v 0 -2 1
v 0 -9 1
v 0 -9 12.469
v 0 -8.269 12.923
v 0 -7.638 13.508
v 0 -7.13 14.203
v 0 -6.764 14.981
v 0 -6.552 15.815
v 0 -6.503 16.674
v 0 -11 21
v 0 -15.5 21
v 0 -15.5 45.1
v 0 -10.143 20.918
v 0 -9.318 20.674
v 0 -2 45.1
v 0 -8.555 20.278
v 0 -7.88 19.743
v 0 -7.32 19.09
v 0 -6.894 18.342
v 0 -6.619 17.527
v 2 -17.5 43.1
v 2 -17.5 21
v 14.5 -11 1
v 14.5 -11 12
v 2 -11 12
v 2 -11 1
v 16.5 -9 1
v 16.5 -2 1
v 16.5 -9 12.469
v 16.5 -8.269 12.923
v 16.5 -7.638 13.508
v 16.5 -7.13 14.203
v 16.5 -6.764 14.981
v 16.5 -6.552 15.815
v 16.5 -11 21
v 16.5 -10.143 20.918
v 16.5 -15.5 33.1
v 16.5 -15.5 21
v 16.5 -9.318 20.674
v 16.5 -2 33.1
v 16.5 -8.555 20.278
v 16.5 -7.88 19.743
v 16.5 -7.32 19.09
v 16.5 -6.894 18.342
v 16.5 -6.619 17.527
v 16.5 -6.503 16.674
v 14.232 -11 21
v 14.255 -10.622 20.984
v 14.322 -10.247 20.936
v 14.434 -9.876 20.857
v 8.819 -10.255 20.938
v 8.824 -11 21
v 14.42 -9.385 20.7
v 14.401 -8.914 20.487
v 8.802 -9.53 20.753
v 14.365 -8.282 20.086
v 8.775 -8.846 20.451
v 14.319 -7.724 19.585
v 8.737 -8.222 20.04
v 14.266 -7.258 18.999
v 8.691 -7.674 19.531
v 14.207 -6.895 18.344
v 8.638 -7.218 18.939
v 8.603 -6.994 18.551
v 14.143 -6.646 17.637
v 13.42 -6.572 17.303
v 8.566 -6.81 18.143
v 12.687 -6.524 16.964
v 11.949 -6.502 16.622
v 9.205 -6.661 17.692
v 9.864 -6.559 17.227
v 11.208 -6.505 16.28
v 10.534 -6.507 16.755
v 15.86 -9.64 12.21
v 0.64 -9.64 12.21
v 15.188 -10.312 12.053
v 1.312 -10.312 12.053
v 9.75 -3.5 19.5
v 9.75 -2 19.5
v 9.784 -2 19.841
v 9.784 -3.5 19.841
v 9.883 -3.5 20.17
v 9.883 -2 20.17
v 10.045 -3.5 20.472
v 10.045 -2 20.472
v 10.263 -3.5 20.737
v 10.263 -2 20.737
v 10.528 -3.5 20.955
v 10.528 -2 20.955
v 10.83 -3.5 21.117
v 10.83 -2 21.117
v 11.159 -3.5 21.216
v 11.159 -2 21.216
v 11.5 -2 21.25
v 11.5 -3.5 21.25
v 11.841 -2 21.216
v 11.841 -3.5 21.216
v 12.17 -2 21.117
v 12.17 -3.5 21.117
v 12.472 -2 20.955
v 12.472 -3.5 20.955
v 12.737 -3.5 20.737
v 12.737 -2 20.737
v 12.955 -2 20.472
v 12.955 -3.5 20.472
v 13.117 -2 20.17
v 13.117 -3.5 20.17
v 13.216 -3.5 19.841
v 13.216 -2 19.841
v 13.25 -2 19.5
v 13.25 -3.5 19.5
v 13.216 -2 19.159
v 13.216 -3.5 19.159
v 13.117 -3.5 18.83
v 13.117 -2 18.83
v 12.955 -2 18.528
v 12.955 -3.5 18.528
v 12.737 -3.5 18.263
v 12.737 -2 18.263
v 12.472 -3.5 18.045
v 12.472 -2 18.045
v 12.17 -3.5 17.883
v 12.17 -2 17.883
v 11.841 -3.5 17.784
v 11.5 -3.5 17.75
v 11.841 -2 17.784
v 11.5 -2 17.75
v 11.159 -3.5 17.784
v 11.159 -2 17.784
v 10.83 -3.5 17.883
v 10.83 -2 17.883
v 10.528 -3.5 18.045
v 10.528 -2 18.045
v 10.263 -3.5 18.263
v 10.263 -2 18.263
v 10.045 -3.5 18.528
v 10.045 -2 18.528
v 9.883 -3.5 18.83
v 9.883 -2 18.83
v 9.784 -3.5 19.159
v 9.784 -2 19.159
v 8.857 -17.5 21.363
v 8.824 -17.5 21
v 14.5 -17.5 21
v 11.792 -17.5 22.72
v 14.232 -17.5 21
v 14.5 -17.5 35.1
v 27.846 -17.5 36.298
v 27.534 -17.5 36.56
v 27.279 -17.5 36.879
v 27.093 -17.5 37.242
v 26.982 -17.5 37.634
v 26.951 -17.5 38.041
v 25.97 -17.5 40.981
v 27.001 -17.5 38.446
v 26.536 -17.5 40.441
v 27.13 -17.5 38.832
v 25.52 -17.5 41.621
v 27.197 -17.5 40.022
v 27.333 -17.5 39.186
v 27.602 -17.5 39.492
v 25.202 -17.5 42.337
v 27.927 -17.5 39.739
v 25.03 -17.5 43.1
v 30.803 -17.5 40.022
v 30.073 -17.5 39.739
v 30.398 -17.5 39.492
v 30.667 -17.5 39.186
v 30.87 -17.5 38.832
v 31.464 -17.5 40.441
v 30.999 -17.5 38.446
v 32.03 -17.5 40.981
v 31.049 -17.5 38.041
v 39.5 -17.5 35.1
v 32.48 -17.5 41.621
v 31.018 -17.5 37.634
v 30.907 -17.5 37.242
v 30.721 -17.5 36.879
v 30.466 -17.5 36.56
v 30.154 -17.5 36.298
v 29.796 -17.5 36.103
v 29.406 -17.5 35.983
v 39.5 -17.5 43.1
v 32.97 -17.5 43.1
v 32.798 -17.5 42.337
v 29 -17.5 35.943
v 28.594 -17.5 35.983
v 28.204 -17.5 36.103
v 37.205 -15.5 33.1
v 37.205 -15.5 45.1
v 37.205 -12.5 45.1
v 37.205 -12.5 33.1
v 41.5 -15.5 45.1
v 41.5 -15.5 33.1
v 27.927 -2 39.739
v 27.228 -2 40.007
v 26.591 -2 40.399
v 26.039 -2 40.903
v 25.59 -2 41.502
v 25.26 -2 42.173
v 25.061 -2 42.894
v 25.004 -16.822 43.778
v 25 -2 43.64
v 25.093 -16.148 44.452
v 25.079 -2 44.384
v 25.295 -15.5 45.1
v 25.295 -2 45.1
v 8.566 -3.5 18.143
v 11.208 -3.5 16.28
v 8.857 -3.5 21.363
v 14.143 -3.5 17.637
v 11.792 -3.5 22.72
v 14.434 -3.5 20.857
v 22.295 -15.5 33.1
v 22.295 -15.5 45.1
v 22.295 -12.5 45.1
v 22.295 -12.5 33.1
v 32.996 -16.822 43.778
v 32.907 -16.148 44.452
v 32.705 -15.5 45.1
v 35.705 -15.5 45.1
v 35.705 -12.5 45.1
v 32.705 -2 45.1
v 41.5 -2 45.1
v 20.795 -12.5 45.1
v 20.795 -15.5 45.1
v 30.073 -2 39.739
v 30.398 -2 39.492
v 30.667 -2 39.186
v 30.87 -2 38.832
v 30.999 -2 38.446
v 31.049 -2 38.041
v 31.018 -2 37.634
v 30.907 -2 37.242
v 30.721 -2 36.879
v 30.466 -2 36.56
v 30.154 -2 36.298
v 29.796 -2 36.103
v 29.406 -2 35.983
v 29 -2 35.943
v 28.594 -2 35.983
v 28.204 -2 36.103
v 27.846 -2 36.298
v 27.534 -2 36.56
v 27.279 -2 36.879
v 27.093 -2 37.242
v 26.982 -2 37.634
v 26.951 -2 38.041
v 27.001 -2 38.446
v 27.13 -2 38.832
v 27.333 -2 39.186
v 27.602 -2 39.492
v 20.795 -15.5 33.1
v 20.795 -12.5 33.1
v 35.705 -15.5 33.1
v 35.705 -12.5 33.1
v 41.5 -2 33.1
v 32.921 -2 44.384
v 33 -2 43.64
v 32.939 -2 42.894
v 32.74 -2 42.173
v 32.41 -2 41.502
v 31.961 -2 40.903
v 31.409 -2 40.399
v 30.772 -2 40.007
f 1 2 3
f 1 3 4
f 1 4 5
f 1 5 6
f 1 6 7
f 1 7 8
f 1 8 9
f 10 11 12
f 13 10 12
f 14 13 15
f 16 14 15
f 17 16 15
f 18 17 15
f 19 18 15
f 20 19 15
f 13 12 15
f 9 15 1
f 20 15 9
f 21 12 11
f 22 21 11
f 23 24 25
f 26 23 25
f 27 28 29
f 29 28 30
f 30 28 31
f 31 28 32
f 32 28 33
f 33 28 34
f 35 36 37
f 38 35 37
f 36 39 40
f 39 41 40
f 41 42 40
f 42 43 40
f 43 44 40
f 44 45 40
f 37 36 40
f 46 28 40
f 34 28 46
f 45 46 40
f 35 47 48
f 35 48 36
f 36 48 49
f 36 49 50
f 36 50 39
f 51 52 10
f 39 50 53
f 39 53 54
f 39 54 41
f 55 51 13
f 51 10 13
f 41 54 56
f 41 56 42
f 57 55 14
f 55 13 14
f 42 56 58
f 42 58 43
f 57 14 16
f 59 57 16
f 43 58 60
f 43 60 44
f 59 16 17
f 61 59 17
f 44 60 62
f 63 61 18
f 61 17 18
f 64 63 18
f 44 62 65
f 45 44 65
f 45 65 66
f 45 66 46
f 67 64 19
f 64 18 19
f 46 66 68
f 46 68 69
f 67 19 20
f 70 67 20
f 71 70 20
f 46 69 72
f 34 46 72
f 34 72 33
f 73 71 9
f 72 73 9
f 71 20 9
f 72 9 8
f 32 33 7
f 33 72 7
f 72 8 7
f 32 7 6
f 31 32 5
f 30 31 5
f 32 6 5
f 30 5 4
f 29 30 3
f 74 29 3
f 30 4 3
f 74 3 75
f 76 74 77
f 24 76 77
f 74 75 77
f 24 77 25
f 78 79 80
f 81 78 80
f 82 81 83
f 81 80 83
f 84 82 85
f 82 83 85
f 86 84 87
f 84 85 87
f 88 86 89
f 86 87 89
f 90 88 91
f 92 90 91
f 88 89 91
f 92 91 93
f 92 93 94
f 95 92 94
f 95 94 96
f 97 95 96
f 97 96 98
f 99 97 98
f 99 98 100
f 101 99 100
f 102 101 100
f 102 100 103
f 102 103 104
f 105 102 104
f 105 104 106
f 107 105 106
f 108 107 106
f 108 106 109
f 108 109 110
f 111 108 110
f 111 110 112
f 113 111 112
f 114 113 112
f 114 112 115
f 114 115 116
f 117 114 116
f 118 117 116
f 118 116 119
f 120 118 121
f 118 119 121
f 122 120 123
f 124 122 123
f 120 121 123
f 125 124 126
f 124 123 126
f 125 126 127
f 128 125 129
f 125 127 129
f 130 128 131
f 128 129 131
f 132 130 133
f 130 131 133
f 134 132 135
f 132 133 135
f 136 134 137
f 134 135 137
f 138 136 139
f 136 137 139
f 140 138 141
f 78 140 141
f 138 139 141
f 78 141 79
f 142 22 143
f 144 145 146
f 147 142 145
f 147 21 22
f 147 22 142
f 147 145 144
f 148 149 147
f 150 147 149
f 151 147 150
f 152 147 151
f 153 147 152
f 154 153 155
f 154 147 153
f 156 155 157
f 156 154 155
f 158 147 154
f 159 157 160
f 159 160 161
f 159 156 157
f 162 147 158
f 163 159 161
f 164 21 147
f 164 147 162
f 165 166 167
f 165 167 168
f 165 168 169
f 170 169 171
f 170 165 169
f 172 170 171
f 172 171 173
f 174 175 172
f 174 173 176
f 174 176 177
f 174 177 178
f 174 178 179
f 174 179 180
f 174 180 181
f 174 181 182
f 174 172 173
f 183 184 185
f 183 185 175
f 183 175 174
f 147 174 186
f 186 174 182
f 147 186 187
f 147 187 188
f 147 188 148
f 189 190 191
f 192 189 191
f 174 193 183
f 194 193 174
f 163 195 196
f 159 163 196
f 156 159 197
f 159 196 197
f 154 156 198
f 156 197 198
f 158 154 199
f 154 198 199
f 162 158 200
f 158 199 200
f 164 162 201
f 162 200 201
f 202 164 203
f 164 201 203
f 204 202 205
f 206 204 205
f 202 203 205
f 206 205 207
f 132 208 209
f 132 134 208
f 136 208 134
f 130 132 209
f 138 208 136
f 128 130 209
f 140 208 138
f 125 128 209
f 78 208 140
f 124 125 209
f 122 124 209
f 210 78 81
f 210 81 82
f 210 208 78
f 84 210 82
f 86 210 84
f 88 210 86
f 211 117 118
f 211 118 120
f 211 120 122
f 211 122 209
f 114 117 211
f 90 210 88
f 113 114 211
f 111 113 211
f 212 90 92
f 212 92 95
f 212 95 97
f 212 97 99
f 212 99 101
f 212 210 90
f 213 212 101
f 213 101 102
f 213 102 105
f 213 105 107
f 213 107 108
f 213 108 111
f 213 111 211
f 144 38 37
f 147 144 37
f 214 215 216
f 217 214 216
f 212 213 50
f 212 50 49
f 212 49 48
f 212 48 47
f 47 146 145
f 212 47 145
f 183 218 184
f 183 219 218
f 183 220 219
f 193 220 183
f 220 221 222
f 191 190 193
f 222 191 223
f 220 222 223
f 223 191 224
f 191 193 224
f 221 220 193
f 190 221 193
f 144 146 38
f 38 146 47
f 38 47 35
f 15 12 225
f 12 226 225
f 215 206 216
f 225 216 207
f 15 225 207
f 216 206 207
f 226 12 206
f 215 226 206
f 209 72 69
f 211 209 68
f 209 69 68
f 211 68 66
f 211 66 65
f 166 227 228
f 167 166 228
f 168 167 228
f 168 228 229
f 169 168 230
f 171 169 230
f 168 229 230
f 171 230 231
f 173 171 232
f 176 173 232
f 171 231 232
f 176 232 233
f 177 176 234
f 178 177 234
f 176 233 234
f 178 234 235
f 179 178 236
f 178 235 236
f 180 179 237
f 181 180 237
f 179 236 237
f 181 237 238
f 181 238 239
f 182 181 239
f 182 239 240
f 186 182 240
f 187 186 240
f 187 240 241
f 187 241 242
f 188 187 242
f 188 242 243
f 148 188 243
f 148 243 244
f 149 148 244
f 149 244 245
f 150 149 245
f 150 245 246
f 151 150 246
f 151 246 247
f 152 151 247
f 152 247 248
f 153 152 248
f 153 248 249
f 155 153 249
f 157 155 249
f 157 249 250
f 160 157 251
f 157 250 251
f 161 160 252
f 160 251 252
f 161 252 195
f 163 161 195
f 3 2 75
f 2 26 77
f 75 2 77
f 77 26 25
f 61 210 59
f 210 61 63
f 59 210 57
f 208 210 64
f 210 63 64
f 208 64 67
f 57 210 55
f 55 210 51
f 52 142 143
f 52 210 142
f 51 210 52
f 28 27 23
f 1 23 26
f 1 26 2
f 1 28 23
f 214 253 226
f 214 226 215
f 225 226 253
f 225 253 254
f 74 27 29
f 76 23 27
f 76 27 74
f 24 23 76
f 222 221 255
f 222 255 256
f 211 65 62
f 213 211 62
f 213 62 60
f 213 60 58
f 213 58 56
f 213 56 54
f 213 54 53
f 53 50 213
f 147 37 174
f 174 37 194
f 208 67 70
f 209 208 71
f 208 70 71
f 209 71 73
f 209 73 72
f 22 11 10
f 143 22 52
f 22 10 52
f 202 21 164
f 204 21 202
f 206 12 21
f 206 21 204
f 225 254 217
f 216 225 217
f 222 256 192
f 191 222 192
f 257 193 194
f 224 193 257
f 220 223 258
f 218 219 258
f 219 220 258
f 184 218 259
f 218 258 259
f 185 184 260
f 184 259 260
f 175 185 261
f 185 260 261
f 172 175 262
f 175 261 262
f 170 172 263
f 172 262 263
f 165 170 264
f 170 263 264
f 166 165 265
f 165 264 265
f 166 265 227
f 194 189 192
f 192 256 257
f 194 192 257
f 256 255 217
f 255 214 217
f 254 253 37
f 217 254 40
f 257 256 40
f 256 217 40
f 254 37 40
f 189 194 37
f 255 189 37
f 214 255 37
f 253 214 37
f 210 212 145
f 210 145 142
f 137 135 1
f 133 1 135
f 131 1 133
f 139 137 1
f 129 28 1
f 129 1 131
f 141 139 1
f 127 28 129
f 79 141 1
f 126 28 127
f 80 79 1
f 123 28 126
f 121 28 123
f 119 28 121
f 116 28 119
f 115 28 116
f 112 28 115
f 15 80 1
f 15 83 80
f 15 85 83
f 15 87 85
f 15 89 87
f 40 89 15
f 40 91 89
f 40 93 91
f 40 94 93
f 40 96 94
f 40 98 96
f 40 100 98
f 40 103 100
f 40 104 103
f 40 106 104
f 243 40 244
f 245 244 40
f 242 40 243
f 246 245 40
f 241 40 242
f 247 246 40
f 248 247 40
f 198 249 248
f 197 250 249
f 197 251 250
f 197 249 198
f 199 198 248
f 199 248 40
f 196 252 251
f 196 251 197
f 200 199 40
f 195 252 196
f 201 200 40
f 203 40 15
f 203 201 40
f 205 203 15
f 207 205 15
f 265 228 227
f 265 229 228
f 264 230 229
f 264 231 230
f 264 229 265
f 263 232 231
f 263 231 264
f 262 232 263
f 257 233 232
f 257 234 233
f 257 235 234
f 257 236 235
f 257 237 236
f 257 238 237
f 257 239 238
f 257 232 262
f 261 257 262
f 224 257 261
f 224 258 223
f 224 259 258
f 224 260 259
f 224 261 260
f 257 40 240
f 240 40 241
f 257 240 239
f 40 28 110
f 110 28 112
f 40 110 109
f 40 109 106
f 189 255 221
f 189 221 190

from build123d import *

# Parameters (mm, degrees)
F1_DEPTH  = 17.5
F2_W      = 16.5
F2_H      = 20
F3_DEPTH  = 11
F4_R      = 1.75
F6_DEPTH  = 22.5
F8_DEPTH  = 7.5
F9_DEPTH  = 13.1
F10_DEPTH = 24.9
F11_R     = 1.75
F12_DEPTH = 2
F13_W     = 15.5
F13_H     = 6.6
F13_H_2   = 5.4
F14_DEPTH = 25
F15_DEPTH = 16.5
F17_DEPTH = 25
F18_W     = 1.5
F18_H     = 3
F19_DEPTH = 25
F21_DEPTH = 15.5
F22_SIZE  = 1.99999
F23_SIZE  = 2


# Not quite as in the source:
# - a fillet or chamfer is up to 0.001 mm smaller than in the source, because OpenCascade refuses the exact size


with BuildPart() as f1:
    # F0 (on Front) → F1 (new body)
    with BuildSketch(Plane.XZ):
        with BuildLine():
            Line((16.5, 21), (16.5, 21.3678174192))
            Line((16.5, 21.3678174192), (16.5, 38.5))
            Line((16.5, 38.5), (11.9580992435, 38.5))
            ThreePointArc((11.9580992435, 38.5), (11.8488094961, 35.2539844758), (9.3668783978, 33.1590909091))
            ThreePointArc((9.3668783978, 33.1590909091), (8.25, 29.3900555271), (7.1331216022, 33.1590909091))
            ThreePointArc((7.1331216022, 33.1590909091), (4.6511905039, 35.2539844758), (4.5419007565, 38.5))
            Line((4.5419007565, 38.5), (0, 38.5))
            Line((0, 38.5), (0, 21.3678174192))
            Line((0, 21.3678174192), (0, 21))
            Line((0, 21), (8.25, 21))
            Line((8.25, 21), (16.5, 21))
        make_face()
    extrude(amount=F1_DEPTH)

    # F2 (on face) → F3 (join)
    with BuildSketch(Plane(origin=(0, 0, 0), x_dir=(-1, 0, 0), z_dir=(0, 1, 0))):
        with Locations((-8.25, 11)):
            Rectangle(F2_W, F2_H)
    extrude(amount=-F3_DEPTH)

    # F4 (on face) → F6 (cut)
    with BuildSketch(Plane(origin=(0, 0, 0), x_dir=(-1, 0, 0), z_dir=(0, 1, 0))):
        with Locations((-11.5, 19.5)):
            Circle(F4_R)
    extrude(amount=-F6_DEPTH, mode=Mode.SUBTRACT)

    # F7 (on face) → F8 (cut)
    with BuildSketch(Plane.XZ.offset(11)):
        Polygon((14.1428062528, 17.6374994111), (14.4343759509, 20.8574870578), (11.7915696981, 22.7199876466), (8.8571937472, 21.3625005889), (8.5656240491, 18.1425129422), (11.2084303019, 16.2800123534), align=None)
    extrude(amount=-F8_DEPTH, mode=Mode.SUBTRACT)

    # F7 (on face) → F9 (cut)
    with BuildSketch(Plane.XZ.offset(11)):
        Polygon((14.1428062528, 17.6374994111), (14.4343759509, 20.8574870578), (11.7915696981, 22.7199876466), (8.8571937472, 21.3625005889), (8.5656240491, 18.1425129422), (11.2084303019, 16.2800123534), align=None)
    extrude(amount=F9_DEPTH, mode=Mode.SUBTRACT)

    # F5 (on face) → F10 (cut)
    with BuildSketch(Plane(origin=(0, 0, 0), x_dir=(0, -1, 0), z_dir=(-1, 0, 0))):
        with BuildLine():
            Line((11, 16.5), (11, 21))
            ThreePointArc((11, 21), (6.5, 16.5), (11, 12))
            Line((11, 12), (11, 16.5))
        make_face()
    extrude(amount=-F10_DEPTH, mode=Mode.SUBTRACT)

    # F11 (on face) → F12 (cut)
    with BuildSketch(Plane(origin=(0, 0, 0), x_dir=(-1, 0, 0), z_dir=(0, 1, 0))):
        with BuildLine():
            Line((-11.9580992435, 38.5), (-16.5, 38.5))
            Line((-16.5, 38.5), (-16.5, 1))
            Line((-16.5, 1), (0, 1))
            Line((0, 1), (0, 38.5))
            Line((0, 38.5), (-4.5419007565, 38.5))
            ThreePointArc((-4.5419007565, 38.5), (-4.6511905039, 35.2539844758), (-7.1331216022, 33.1590909091))
            ThreePointArc((-7.1331216022, 33.1590909091), (-8.25, 29.3900555271), (-9.3668783978, 33.1590909091))
            ThreePointArc((-9.3668783978, 33.1590909091), (-11.8488094961, 35.2539844758), (-11.9580992435, 38.5))
        make_face()
        with Locations((-11.5, 19.5)):
            Circle(F11_R, mode=Mode.SUBTRACT)
    extrude(amount=-F12_DEPTH, mode=Mode.SUBTRACT)

    # F13 (on face) → F14 (join)
    with BuildSketch(Plane.YZ.offset(16.5)):
        with Locations((-9.75, 41.8)):
            Rectangle(F13_W, F13_H)
        with Locations((-9.75, 35.8)):
            Rectangle(F13_W, F13_H_2)
    extrude(amount=F14_DEPTH)

    # F15 (add): a face of the model
    f15_faces = [f1.faces().sort_by_distance(p)[0] for p in [
        (16.5, -9.75, 41.8),
    ]]
    extrude(f15_faces, amount=F15_DEPTH)

    # F16 (on face) → F17 (cut)
    with BuildSketch(Plane(origin=(0, -2, 0), x_dir=(-1, 0, 0), z_dir=(0, 1, 0))):
        with BuildLine():
            ThreePointArc((-30.0731763785, 39.739389973), (-29, 35.9427381873), (-27.9268236215, 39.739389973))
            ThreePointArc((-27.9268236215, 39.739389973), (-25.4094368312, 41.8298269216), (-25.2948465851, 45.1))
            Line((-25.2948465851, 45.1), (-32.7051534149, 45.1))
            ThreePointArc((-32.7051534149, 45.1), (-32.5905631688, 41.8298269216), (-30.0731763785, 39.739389973))
        make_face()
    extrude(amount=-F17_DEPTH, mode=Mode.SUBTRACT)

    # F18 (on face) → F19 (cut)
    with BuildSketch(Plane.XY.offset(45.1)):
        with Locations((21.5448465851, -14)):
            Rectangle(F18_W, F18_H)
        with Locations((36.4551534149, -14)):
            Rectangle(F18_W, F18_H)
    extrude(amount=-F19_DEPTH, mode=Mode.SUBTRACT)

    # F20 (on face) → F21 (join)
    with BuildSketch(Plane.XZ.offset(17.5)):
        with BuildLine():
            Line((10.089985095, 38.5), (10.0875691268, 38.5))
            Line((10.0875691268, 38.5), (4.5419007565, 38.5))
            ThreePointArc((4.5419007565, 38.5), (4.6511905039, 35.2539844758), (7.1331216022, 33.1590909091))
            ThreePointArc((7.1331216022, 33.1590909091), (8.25, 29.3900555271), (9.3668783978, 33.1590909091))
            ThreePointArc((9.3668783978, 33.1590909091), (11.8488094961, 35.2539844758), (11.9580992435, 38.5))
            Line((11.9580992435, 38.5), (10.089985095, 38.5))
        make_face()
    extrude(amount=-F21_DEPTH)

    # F22 (size 2 in the source; OpenCascade refuses exactly that, so slightly less here)
    f22_edges = [f1.edges().sort_by_distance(p)[0] for p in [
        (41.5, -17.5, 39.1),
        (0, -17.5, 33.05),
        (16.5, -17.5, 27.05),
        (29, -17.5, 33.1),
        (12.647423, -17.5, 45.1),
        (37.102577, -17.5, 45.1),
    ]]
    chamfer(f22_edges, length=F22_SIZE)

    # F23
    f23_edges = [f1.edges().sort_by_distance(p)[0] for p in [
        (0, -11, 6.5),
        (16.5, -11, 6.5),
    ]]
    chamfer(f23_edges, length=F23_SIZE)


solid = f1.part
